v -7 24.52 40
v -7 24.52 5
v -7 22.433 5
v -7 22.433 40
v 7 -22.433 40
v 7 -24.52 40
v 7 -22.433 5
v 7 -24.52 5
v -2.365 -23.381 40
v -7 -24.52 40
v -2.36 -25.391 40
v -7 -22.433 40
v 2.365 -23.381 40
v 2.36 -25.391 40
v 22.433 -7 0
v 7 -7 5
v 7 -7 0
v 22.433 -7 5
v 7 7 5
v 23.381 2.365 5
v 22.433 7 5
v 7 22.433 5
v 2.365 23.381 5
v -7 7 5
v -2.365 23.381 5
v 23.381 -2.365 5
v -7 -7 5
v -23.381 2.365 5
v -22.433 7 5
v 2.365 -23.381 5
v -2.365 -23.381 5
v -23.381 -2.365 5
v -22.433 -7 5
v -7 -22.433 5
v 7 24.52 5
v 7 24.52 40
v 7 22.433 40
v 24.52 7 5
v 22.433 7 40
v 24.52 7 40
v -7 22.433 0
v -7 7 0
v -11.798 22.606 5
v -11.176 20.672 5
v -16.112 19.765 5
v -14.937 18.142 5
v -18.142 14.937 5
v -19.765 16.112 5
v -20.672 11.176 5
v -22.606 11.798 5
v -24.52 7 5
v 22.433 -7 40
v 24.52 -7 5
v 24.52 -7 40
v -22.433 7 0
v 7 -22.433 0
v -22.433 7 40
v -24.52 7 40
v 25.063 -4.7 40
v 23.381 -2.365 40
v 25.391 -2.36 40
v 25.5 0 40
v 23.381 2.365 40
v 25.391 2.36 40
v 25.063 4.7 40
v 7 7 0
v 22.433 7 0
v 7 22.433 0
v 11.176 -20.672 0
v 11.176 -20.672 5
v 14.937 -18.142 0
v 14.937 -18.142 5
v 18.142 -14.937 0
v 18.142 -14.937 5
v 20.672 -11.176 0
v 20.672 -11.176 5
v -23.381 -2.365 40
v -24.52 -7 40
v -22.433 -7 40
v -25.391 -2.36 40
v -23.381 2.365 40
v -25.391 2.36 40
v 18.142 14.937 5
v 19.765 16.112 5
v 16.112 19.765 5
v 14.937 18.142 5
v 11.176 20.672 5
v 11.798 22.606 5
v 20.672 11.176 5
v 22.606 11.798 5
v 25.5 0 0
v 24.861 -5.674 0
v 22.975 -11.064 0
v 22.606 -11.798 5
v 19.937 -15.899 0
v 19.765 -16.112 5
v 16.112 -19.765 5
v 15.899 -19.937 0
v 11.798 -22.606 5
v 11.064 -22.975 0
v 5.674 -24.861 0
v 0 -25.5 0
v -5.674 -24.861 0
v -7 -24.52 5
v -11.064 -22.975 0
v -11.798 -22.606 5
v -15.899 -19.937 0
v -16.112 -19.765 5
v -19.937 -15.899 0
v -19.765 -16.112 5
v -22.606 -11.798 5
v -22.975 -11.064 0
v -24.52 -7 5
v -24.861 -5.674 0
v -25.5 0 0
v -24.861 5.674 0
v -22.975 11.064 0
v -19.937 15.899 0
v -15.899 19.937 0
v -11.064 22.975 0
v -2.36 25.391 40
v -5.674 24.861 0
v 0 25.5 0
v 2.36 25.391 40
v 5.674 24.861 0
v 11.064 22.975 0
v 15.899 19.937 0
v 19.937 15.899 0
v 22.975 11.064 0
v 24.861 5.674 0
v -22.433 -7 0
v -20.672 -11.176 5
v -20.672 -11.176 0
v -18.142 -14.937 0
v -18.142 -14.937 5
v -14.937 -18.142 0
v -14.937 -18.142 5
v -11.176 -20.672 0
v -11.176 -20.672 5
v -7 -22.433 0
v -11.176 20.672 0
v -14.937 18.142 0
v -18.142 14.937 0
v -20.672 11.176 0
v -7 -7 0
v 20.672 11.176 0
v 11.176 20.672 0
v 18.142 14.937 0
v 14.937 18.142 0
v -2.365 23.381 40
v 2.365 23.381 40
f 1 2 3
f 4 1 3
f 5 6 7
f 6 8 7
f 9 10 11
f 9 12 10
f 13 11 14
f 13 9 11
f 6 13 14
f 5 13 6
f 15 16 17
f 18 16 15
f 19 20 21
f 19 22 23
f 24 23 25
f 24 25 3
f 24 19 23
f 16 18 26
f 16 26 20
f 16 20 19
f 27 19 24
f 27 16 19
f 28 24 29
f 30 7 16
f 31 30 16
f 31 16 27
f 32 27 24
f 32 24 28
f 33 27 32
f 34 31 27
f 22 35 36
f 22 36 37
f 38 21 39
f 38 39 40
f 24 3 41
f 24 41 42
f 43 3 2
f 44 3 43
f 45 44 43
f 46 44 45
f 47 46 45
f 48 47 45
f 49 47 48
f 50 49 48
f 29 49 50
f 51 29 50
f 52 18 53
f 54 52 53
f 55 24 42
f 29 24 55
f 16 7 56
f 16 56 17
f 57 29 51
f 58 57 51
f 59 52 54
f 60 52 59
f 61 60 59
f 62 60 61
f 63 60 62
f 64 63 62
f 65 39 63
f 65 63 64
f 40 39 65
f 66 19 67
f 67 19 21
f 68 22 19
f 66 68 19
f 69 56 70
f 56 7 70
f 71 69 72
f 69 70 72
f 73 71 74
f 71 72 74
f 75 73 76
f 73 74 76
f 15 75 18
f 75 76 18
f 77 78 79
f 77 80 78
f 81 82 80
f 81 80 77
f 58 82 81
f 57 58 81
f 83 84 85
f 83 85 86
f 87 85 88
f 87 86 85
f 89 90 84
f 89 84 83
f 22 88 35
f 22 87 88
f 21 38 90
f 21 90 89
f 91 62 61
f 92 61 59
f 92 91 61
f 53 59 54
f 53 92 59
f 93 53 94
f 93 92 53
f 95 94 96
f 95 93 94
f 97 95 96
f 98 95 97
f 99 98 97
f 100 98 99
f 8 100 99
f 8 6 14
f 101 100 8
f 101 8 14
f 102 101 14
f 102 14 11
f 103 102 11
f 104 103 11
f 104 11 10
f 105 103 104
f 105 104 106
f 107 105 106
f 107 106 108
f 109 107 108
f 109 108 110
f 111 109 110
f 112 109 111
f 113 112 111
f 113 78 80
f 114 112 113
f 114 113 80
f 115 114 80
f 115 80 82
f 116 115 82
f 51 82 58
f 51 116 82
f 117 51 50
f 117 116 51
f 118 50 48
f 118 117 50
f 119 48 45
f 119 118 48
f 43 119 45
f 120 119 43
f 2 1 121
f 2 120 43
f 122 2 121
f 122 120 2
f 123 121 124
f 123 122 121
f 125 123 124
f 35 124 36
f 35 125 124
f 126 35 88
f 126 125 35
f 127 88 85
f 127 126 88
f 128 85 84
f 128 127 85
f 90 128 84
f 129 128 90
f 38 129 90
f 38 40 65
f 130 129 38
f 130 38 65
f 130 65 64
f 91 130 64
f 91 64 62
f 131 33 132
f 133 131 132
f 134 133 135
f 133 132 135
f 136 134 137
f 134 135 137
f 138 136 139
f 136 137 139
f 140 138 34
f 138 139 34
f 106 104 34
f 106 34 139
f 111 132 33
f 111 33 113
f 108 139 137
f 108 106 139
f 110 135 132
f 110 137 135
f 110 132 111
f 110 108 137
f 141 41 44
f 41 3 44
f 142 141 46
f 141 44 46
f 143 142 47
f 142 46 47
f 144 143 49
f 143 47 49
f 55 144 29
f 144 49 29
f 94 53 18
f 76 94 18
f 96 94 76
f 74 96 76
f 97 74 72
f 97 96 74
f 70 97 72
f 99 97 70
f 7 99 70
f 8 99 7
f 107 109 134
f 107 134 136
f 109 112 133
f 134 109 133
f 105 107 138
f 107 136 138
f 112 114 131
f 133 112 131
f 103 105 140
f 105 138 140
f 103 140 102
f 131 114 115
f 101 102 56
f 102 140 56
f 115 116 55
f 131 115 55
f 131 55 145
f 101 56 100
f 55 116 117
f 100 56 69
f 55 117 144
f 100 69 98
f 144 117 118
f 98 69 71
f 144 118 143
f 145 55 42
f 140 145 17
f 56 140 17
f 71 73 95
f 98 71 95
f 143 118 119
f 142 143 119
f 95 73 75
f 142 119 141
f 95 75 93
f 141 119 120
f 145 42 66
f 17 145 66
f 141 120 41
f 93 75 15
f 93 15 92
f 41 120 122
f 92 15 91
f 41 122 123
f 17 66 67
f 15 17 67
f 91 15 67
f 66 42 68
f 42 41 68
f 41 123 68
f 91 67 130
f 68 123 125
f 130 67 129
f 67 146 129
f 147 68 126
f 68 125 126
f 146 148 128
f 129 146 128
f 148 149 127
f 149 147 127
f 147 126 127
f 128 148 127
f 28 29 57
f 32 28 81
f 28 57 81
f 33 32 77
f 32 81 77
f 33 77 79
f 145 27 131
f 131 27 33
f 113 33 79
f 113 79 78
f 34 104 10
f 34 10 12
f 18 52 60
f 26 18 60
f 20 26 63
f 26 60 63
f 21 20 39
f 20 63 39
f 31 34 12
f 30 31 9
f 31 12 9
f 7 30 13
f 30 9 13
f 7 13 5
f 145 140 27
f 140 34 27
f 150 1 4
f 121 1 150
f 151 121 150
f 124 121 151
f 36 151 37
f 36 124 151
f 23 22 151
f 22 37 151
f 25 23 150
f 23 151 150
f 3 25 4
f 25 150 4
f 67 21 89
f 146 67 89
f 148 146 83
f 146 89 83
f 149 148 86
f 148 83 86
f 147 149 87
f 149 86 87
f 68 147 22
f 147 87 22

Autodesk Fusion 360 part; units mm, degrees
sketch "スケッチ1" plane through (0, 0, 0) normal (0, 0, 1) x (1, 0, 0)
  circle A0 centre (0, 0) radius 25.5
  dimension "d1" = 51
extrude "押し出し1" add sketch "スケッチ1" along normal blind 40
sketch "スケッチ2" plane through (0, 0, 40) normal (0, 0, 1) x (-1, 0, 0)
  circle A0 centre (0, 0) radius 25.5
  circle A1 centre (0, 0) radius 23.5
  dimension "d4" = 47
extrude "押し出し2" cut sketch "スケッチ2" against normal blind 35 contours A1
sketch "スケッチ3" plane through (0, 0, 5) normal (0, 0, 1) x (-1, 0, 0)
  circle A0 centre (0, 0) radius 23.5
  line L0 (7, -7) -> (32, -7)
  line L1 (32, -7) -> (32, -32)
  line L2 (32, -32) -> (7, -32)
  line L3 (7, -32) -> (7, -7)
  line L4 (7, 7) -> (32, 7)
  line L5 (32, 7) -> (32, 32)
  line L6 (32, 32) -> (7, 32)
  line L7 (7, 32) -> (7, 7)
  line L8 (-7, 7) -> (-32, 7)
  line L9 (-32, 7) -> (-32, 32)
  line L10 (-32, 32) -> (-7, 32)
  line L11 (-7, 32) -> (-7, 7)
  line L12 (-7, -7) -> (-32, -7)
  line L13 (-32, -7) -> (-32, -32)
  line L14 (-32, -32) -> (-7, -32)
  line L15 (-7, -32) -> (-7, -7)
  dimension "d7" = 25
  dimension "d8" = 25
  dimension "d9" = 25
  dimension "d10" = 25
  dimension "d11" = 25
  dimension "d12" = 25
  dimension "d13" = 25
  dimension "d14" = 25
extrude "押し出し3" cut sketch "スケッチ3" along normal blind 35 contours A0 L12 L13 L14 L15
extrude "押し出し4" cut sketch "スケッチ3" along normal blind 35 contours A0 L0 L1 L2 L3
extrude "押し出し5" cut sketch "スケッチ3" along normal blind 35 contours A0 L4 L5 L6 L7 | A0 L8 L9 L10 L11
extrude "押し出し6" cut sketch "スケッチ3" against normal blind 5 contours A0 L4 L7 | A0 L0 L3 | A0 L8 L11 | A0 L12 L15
